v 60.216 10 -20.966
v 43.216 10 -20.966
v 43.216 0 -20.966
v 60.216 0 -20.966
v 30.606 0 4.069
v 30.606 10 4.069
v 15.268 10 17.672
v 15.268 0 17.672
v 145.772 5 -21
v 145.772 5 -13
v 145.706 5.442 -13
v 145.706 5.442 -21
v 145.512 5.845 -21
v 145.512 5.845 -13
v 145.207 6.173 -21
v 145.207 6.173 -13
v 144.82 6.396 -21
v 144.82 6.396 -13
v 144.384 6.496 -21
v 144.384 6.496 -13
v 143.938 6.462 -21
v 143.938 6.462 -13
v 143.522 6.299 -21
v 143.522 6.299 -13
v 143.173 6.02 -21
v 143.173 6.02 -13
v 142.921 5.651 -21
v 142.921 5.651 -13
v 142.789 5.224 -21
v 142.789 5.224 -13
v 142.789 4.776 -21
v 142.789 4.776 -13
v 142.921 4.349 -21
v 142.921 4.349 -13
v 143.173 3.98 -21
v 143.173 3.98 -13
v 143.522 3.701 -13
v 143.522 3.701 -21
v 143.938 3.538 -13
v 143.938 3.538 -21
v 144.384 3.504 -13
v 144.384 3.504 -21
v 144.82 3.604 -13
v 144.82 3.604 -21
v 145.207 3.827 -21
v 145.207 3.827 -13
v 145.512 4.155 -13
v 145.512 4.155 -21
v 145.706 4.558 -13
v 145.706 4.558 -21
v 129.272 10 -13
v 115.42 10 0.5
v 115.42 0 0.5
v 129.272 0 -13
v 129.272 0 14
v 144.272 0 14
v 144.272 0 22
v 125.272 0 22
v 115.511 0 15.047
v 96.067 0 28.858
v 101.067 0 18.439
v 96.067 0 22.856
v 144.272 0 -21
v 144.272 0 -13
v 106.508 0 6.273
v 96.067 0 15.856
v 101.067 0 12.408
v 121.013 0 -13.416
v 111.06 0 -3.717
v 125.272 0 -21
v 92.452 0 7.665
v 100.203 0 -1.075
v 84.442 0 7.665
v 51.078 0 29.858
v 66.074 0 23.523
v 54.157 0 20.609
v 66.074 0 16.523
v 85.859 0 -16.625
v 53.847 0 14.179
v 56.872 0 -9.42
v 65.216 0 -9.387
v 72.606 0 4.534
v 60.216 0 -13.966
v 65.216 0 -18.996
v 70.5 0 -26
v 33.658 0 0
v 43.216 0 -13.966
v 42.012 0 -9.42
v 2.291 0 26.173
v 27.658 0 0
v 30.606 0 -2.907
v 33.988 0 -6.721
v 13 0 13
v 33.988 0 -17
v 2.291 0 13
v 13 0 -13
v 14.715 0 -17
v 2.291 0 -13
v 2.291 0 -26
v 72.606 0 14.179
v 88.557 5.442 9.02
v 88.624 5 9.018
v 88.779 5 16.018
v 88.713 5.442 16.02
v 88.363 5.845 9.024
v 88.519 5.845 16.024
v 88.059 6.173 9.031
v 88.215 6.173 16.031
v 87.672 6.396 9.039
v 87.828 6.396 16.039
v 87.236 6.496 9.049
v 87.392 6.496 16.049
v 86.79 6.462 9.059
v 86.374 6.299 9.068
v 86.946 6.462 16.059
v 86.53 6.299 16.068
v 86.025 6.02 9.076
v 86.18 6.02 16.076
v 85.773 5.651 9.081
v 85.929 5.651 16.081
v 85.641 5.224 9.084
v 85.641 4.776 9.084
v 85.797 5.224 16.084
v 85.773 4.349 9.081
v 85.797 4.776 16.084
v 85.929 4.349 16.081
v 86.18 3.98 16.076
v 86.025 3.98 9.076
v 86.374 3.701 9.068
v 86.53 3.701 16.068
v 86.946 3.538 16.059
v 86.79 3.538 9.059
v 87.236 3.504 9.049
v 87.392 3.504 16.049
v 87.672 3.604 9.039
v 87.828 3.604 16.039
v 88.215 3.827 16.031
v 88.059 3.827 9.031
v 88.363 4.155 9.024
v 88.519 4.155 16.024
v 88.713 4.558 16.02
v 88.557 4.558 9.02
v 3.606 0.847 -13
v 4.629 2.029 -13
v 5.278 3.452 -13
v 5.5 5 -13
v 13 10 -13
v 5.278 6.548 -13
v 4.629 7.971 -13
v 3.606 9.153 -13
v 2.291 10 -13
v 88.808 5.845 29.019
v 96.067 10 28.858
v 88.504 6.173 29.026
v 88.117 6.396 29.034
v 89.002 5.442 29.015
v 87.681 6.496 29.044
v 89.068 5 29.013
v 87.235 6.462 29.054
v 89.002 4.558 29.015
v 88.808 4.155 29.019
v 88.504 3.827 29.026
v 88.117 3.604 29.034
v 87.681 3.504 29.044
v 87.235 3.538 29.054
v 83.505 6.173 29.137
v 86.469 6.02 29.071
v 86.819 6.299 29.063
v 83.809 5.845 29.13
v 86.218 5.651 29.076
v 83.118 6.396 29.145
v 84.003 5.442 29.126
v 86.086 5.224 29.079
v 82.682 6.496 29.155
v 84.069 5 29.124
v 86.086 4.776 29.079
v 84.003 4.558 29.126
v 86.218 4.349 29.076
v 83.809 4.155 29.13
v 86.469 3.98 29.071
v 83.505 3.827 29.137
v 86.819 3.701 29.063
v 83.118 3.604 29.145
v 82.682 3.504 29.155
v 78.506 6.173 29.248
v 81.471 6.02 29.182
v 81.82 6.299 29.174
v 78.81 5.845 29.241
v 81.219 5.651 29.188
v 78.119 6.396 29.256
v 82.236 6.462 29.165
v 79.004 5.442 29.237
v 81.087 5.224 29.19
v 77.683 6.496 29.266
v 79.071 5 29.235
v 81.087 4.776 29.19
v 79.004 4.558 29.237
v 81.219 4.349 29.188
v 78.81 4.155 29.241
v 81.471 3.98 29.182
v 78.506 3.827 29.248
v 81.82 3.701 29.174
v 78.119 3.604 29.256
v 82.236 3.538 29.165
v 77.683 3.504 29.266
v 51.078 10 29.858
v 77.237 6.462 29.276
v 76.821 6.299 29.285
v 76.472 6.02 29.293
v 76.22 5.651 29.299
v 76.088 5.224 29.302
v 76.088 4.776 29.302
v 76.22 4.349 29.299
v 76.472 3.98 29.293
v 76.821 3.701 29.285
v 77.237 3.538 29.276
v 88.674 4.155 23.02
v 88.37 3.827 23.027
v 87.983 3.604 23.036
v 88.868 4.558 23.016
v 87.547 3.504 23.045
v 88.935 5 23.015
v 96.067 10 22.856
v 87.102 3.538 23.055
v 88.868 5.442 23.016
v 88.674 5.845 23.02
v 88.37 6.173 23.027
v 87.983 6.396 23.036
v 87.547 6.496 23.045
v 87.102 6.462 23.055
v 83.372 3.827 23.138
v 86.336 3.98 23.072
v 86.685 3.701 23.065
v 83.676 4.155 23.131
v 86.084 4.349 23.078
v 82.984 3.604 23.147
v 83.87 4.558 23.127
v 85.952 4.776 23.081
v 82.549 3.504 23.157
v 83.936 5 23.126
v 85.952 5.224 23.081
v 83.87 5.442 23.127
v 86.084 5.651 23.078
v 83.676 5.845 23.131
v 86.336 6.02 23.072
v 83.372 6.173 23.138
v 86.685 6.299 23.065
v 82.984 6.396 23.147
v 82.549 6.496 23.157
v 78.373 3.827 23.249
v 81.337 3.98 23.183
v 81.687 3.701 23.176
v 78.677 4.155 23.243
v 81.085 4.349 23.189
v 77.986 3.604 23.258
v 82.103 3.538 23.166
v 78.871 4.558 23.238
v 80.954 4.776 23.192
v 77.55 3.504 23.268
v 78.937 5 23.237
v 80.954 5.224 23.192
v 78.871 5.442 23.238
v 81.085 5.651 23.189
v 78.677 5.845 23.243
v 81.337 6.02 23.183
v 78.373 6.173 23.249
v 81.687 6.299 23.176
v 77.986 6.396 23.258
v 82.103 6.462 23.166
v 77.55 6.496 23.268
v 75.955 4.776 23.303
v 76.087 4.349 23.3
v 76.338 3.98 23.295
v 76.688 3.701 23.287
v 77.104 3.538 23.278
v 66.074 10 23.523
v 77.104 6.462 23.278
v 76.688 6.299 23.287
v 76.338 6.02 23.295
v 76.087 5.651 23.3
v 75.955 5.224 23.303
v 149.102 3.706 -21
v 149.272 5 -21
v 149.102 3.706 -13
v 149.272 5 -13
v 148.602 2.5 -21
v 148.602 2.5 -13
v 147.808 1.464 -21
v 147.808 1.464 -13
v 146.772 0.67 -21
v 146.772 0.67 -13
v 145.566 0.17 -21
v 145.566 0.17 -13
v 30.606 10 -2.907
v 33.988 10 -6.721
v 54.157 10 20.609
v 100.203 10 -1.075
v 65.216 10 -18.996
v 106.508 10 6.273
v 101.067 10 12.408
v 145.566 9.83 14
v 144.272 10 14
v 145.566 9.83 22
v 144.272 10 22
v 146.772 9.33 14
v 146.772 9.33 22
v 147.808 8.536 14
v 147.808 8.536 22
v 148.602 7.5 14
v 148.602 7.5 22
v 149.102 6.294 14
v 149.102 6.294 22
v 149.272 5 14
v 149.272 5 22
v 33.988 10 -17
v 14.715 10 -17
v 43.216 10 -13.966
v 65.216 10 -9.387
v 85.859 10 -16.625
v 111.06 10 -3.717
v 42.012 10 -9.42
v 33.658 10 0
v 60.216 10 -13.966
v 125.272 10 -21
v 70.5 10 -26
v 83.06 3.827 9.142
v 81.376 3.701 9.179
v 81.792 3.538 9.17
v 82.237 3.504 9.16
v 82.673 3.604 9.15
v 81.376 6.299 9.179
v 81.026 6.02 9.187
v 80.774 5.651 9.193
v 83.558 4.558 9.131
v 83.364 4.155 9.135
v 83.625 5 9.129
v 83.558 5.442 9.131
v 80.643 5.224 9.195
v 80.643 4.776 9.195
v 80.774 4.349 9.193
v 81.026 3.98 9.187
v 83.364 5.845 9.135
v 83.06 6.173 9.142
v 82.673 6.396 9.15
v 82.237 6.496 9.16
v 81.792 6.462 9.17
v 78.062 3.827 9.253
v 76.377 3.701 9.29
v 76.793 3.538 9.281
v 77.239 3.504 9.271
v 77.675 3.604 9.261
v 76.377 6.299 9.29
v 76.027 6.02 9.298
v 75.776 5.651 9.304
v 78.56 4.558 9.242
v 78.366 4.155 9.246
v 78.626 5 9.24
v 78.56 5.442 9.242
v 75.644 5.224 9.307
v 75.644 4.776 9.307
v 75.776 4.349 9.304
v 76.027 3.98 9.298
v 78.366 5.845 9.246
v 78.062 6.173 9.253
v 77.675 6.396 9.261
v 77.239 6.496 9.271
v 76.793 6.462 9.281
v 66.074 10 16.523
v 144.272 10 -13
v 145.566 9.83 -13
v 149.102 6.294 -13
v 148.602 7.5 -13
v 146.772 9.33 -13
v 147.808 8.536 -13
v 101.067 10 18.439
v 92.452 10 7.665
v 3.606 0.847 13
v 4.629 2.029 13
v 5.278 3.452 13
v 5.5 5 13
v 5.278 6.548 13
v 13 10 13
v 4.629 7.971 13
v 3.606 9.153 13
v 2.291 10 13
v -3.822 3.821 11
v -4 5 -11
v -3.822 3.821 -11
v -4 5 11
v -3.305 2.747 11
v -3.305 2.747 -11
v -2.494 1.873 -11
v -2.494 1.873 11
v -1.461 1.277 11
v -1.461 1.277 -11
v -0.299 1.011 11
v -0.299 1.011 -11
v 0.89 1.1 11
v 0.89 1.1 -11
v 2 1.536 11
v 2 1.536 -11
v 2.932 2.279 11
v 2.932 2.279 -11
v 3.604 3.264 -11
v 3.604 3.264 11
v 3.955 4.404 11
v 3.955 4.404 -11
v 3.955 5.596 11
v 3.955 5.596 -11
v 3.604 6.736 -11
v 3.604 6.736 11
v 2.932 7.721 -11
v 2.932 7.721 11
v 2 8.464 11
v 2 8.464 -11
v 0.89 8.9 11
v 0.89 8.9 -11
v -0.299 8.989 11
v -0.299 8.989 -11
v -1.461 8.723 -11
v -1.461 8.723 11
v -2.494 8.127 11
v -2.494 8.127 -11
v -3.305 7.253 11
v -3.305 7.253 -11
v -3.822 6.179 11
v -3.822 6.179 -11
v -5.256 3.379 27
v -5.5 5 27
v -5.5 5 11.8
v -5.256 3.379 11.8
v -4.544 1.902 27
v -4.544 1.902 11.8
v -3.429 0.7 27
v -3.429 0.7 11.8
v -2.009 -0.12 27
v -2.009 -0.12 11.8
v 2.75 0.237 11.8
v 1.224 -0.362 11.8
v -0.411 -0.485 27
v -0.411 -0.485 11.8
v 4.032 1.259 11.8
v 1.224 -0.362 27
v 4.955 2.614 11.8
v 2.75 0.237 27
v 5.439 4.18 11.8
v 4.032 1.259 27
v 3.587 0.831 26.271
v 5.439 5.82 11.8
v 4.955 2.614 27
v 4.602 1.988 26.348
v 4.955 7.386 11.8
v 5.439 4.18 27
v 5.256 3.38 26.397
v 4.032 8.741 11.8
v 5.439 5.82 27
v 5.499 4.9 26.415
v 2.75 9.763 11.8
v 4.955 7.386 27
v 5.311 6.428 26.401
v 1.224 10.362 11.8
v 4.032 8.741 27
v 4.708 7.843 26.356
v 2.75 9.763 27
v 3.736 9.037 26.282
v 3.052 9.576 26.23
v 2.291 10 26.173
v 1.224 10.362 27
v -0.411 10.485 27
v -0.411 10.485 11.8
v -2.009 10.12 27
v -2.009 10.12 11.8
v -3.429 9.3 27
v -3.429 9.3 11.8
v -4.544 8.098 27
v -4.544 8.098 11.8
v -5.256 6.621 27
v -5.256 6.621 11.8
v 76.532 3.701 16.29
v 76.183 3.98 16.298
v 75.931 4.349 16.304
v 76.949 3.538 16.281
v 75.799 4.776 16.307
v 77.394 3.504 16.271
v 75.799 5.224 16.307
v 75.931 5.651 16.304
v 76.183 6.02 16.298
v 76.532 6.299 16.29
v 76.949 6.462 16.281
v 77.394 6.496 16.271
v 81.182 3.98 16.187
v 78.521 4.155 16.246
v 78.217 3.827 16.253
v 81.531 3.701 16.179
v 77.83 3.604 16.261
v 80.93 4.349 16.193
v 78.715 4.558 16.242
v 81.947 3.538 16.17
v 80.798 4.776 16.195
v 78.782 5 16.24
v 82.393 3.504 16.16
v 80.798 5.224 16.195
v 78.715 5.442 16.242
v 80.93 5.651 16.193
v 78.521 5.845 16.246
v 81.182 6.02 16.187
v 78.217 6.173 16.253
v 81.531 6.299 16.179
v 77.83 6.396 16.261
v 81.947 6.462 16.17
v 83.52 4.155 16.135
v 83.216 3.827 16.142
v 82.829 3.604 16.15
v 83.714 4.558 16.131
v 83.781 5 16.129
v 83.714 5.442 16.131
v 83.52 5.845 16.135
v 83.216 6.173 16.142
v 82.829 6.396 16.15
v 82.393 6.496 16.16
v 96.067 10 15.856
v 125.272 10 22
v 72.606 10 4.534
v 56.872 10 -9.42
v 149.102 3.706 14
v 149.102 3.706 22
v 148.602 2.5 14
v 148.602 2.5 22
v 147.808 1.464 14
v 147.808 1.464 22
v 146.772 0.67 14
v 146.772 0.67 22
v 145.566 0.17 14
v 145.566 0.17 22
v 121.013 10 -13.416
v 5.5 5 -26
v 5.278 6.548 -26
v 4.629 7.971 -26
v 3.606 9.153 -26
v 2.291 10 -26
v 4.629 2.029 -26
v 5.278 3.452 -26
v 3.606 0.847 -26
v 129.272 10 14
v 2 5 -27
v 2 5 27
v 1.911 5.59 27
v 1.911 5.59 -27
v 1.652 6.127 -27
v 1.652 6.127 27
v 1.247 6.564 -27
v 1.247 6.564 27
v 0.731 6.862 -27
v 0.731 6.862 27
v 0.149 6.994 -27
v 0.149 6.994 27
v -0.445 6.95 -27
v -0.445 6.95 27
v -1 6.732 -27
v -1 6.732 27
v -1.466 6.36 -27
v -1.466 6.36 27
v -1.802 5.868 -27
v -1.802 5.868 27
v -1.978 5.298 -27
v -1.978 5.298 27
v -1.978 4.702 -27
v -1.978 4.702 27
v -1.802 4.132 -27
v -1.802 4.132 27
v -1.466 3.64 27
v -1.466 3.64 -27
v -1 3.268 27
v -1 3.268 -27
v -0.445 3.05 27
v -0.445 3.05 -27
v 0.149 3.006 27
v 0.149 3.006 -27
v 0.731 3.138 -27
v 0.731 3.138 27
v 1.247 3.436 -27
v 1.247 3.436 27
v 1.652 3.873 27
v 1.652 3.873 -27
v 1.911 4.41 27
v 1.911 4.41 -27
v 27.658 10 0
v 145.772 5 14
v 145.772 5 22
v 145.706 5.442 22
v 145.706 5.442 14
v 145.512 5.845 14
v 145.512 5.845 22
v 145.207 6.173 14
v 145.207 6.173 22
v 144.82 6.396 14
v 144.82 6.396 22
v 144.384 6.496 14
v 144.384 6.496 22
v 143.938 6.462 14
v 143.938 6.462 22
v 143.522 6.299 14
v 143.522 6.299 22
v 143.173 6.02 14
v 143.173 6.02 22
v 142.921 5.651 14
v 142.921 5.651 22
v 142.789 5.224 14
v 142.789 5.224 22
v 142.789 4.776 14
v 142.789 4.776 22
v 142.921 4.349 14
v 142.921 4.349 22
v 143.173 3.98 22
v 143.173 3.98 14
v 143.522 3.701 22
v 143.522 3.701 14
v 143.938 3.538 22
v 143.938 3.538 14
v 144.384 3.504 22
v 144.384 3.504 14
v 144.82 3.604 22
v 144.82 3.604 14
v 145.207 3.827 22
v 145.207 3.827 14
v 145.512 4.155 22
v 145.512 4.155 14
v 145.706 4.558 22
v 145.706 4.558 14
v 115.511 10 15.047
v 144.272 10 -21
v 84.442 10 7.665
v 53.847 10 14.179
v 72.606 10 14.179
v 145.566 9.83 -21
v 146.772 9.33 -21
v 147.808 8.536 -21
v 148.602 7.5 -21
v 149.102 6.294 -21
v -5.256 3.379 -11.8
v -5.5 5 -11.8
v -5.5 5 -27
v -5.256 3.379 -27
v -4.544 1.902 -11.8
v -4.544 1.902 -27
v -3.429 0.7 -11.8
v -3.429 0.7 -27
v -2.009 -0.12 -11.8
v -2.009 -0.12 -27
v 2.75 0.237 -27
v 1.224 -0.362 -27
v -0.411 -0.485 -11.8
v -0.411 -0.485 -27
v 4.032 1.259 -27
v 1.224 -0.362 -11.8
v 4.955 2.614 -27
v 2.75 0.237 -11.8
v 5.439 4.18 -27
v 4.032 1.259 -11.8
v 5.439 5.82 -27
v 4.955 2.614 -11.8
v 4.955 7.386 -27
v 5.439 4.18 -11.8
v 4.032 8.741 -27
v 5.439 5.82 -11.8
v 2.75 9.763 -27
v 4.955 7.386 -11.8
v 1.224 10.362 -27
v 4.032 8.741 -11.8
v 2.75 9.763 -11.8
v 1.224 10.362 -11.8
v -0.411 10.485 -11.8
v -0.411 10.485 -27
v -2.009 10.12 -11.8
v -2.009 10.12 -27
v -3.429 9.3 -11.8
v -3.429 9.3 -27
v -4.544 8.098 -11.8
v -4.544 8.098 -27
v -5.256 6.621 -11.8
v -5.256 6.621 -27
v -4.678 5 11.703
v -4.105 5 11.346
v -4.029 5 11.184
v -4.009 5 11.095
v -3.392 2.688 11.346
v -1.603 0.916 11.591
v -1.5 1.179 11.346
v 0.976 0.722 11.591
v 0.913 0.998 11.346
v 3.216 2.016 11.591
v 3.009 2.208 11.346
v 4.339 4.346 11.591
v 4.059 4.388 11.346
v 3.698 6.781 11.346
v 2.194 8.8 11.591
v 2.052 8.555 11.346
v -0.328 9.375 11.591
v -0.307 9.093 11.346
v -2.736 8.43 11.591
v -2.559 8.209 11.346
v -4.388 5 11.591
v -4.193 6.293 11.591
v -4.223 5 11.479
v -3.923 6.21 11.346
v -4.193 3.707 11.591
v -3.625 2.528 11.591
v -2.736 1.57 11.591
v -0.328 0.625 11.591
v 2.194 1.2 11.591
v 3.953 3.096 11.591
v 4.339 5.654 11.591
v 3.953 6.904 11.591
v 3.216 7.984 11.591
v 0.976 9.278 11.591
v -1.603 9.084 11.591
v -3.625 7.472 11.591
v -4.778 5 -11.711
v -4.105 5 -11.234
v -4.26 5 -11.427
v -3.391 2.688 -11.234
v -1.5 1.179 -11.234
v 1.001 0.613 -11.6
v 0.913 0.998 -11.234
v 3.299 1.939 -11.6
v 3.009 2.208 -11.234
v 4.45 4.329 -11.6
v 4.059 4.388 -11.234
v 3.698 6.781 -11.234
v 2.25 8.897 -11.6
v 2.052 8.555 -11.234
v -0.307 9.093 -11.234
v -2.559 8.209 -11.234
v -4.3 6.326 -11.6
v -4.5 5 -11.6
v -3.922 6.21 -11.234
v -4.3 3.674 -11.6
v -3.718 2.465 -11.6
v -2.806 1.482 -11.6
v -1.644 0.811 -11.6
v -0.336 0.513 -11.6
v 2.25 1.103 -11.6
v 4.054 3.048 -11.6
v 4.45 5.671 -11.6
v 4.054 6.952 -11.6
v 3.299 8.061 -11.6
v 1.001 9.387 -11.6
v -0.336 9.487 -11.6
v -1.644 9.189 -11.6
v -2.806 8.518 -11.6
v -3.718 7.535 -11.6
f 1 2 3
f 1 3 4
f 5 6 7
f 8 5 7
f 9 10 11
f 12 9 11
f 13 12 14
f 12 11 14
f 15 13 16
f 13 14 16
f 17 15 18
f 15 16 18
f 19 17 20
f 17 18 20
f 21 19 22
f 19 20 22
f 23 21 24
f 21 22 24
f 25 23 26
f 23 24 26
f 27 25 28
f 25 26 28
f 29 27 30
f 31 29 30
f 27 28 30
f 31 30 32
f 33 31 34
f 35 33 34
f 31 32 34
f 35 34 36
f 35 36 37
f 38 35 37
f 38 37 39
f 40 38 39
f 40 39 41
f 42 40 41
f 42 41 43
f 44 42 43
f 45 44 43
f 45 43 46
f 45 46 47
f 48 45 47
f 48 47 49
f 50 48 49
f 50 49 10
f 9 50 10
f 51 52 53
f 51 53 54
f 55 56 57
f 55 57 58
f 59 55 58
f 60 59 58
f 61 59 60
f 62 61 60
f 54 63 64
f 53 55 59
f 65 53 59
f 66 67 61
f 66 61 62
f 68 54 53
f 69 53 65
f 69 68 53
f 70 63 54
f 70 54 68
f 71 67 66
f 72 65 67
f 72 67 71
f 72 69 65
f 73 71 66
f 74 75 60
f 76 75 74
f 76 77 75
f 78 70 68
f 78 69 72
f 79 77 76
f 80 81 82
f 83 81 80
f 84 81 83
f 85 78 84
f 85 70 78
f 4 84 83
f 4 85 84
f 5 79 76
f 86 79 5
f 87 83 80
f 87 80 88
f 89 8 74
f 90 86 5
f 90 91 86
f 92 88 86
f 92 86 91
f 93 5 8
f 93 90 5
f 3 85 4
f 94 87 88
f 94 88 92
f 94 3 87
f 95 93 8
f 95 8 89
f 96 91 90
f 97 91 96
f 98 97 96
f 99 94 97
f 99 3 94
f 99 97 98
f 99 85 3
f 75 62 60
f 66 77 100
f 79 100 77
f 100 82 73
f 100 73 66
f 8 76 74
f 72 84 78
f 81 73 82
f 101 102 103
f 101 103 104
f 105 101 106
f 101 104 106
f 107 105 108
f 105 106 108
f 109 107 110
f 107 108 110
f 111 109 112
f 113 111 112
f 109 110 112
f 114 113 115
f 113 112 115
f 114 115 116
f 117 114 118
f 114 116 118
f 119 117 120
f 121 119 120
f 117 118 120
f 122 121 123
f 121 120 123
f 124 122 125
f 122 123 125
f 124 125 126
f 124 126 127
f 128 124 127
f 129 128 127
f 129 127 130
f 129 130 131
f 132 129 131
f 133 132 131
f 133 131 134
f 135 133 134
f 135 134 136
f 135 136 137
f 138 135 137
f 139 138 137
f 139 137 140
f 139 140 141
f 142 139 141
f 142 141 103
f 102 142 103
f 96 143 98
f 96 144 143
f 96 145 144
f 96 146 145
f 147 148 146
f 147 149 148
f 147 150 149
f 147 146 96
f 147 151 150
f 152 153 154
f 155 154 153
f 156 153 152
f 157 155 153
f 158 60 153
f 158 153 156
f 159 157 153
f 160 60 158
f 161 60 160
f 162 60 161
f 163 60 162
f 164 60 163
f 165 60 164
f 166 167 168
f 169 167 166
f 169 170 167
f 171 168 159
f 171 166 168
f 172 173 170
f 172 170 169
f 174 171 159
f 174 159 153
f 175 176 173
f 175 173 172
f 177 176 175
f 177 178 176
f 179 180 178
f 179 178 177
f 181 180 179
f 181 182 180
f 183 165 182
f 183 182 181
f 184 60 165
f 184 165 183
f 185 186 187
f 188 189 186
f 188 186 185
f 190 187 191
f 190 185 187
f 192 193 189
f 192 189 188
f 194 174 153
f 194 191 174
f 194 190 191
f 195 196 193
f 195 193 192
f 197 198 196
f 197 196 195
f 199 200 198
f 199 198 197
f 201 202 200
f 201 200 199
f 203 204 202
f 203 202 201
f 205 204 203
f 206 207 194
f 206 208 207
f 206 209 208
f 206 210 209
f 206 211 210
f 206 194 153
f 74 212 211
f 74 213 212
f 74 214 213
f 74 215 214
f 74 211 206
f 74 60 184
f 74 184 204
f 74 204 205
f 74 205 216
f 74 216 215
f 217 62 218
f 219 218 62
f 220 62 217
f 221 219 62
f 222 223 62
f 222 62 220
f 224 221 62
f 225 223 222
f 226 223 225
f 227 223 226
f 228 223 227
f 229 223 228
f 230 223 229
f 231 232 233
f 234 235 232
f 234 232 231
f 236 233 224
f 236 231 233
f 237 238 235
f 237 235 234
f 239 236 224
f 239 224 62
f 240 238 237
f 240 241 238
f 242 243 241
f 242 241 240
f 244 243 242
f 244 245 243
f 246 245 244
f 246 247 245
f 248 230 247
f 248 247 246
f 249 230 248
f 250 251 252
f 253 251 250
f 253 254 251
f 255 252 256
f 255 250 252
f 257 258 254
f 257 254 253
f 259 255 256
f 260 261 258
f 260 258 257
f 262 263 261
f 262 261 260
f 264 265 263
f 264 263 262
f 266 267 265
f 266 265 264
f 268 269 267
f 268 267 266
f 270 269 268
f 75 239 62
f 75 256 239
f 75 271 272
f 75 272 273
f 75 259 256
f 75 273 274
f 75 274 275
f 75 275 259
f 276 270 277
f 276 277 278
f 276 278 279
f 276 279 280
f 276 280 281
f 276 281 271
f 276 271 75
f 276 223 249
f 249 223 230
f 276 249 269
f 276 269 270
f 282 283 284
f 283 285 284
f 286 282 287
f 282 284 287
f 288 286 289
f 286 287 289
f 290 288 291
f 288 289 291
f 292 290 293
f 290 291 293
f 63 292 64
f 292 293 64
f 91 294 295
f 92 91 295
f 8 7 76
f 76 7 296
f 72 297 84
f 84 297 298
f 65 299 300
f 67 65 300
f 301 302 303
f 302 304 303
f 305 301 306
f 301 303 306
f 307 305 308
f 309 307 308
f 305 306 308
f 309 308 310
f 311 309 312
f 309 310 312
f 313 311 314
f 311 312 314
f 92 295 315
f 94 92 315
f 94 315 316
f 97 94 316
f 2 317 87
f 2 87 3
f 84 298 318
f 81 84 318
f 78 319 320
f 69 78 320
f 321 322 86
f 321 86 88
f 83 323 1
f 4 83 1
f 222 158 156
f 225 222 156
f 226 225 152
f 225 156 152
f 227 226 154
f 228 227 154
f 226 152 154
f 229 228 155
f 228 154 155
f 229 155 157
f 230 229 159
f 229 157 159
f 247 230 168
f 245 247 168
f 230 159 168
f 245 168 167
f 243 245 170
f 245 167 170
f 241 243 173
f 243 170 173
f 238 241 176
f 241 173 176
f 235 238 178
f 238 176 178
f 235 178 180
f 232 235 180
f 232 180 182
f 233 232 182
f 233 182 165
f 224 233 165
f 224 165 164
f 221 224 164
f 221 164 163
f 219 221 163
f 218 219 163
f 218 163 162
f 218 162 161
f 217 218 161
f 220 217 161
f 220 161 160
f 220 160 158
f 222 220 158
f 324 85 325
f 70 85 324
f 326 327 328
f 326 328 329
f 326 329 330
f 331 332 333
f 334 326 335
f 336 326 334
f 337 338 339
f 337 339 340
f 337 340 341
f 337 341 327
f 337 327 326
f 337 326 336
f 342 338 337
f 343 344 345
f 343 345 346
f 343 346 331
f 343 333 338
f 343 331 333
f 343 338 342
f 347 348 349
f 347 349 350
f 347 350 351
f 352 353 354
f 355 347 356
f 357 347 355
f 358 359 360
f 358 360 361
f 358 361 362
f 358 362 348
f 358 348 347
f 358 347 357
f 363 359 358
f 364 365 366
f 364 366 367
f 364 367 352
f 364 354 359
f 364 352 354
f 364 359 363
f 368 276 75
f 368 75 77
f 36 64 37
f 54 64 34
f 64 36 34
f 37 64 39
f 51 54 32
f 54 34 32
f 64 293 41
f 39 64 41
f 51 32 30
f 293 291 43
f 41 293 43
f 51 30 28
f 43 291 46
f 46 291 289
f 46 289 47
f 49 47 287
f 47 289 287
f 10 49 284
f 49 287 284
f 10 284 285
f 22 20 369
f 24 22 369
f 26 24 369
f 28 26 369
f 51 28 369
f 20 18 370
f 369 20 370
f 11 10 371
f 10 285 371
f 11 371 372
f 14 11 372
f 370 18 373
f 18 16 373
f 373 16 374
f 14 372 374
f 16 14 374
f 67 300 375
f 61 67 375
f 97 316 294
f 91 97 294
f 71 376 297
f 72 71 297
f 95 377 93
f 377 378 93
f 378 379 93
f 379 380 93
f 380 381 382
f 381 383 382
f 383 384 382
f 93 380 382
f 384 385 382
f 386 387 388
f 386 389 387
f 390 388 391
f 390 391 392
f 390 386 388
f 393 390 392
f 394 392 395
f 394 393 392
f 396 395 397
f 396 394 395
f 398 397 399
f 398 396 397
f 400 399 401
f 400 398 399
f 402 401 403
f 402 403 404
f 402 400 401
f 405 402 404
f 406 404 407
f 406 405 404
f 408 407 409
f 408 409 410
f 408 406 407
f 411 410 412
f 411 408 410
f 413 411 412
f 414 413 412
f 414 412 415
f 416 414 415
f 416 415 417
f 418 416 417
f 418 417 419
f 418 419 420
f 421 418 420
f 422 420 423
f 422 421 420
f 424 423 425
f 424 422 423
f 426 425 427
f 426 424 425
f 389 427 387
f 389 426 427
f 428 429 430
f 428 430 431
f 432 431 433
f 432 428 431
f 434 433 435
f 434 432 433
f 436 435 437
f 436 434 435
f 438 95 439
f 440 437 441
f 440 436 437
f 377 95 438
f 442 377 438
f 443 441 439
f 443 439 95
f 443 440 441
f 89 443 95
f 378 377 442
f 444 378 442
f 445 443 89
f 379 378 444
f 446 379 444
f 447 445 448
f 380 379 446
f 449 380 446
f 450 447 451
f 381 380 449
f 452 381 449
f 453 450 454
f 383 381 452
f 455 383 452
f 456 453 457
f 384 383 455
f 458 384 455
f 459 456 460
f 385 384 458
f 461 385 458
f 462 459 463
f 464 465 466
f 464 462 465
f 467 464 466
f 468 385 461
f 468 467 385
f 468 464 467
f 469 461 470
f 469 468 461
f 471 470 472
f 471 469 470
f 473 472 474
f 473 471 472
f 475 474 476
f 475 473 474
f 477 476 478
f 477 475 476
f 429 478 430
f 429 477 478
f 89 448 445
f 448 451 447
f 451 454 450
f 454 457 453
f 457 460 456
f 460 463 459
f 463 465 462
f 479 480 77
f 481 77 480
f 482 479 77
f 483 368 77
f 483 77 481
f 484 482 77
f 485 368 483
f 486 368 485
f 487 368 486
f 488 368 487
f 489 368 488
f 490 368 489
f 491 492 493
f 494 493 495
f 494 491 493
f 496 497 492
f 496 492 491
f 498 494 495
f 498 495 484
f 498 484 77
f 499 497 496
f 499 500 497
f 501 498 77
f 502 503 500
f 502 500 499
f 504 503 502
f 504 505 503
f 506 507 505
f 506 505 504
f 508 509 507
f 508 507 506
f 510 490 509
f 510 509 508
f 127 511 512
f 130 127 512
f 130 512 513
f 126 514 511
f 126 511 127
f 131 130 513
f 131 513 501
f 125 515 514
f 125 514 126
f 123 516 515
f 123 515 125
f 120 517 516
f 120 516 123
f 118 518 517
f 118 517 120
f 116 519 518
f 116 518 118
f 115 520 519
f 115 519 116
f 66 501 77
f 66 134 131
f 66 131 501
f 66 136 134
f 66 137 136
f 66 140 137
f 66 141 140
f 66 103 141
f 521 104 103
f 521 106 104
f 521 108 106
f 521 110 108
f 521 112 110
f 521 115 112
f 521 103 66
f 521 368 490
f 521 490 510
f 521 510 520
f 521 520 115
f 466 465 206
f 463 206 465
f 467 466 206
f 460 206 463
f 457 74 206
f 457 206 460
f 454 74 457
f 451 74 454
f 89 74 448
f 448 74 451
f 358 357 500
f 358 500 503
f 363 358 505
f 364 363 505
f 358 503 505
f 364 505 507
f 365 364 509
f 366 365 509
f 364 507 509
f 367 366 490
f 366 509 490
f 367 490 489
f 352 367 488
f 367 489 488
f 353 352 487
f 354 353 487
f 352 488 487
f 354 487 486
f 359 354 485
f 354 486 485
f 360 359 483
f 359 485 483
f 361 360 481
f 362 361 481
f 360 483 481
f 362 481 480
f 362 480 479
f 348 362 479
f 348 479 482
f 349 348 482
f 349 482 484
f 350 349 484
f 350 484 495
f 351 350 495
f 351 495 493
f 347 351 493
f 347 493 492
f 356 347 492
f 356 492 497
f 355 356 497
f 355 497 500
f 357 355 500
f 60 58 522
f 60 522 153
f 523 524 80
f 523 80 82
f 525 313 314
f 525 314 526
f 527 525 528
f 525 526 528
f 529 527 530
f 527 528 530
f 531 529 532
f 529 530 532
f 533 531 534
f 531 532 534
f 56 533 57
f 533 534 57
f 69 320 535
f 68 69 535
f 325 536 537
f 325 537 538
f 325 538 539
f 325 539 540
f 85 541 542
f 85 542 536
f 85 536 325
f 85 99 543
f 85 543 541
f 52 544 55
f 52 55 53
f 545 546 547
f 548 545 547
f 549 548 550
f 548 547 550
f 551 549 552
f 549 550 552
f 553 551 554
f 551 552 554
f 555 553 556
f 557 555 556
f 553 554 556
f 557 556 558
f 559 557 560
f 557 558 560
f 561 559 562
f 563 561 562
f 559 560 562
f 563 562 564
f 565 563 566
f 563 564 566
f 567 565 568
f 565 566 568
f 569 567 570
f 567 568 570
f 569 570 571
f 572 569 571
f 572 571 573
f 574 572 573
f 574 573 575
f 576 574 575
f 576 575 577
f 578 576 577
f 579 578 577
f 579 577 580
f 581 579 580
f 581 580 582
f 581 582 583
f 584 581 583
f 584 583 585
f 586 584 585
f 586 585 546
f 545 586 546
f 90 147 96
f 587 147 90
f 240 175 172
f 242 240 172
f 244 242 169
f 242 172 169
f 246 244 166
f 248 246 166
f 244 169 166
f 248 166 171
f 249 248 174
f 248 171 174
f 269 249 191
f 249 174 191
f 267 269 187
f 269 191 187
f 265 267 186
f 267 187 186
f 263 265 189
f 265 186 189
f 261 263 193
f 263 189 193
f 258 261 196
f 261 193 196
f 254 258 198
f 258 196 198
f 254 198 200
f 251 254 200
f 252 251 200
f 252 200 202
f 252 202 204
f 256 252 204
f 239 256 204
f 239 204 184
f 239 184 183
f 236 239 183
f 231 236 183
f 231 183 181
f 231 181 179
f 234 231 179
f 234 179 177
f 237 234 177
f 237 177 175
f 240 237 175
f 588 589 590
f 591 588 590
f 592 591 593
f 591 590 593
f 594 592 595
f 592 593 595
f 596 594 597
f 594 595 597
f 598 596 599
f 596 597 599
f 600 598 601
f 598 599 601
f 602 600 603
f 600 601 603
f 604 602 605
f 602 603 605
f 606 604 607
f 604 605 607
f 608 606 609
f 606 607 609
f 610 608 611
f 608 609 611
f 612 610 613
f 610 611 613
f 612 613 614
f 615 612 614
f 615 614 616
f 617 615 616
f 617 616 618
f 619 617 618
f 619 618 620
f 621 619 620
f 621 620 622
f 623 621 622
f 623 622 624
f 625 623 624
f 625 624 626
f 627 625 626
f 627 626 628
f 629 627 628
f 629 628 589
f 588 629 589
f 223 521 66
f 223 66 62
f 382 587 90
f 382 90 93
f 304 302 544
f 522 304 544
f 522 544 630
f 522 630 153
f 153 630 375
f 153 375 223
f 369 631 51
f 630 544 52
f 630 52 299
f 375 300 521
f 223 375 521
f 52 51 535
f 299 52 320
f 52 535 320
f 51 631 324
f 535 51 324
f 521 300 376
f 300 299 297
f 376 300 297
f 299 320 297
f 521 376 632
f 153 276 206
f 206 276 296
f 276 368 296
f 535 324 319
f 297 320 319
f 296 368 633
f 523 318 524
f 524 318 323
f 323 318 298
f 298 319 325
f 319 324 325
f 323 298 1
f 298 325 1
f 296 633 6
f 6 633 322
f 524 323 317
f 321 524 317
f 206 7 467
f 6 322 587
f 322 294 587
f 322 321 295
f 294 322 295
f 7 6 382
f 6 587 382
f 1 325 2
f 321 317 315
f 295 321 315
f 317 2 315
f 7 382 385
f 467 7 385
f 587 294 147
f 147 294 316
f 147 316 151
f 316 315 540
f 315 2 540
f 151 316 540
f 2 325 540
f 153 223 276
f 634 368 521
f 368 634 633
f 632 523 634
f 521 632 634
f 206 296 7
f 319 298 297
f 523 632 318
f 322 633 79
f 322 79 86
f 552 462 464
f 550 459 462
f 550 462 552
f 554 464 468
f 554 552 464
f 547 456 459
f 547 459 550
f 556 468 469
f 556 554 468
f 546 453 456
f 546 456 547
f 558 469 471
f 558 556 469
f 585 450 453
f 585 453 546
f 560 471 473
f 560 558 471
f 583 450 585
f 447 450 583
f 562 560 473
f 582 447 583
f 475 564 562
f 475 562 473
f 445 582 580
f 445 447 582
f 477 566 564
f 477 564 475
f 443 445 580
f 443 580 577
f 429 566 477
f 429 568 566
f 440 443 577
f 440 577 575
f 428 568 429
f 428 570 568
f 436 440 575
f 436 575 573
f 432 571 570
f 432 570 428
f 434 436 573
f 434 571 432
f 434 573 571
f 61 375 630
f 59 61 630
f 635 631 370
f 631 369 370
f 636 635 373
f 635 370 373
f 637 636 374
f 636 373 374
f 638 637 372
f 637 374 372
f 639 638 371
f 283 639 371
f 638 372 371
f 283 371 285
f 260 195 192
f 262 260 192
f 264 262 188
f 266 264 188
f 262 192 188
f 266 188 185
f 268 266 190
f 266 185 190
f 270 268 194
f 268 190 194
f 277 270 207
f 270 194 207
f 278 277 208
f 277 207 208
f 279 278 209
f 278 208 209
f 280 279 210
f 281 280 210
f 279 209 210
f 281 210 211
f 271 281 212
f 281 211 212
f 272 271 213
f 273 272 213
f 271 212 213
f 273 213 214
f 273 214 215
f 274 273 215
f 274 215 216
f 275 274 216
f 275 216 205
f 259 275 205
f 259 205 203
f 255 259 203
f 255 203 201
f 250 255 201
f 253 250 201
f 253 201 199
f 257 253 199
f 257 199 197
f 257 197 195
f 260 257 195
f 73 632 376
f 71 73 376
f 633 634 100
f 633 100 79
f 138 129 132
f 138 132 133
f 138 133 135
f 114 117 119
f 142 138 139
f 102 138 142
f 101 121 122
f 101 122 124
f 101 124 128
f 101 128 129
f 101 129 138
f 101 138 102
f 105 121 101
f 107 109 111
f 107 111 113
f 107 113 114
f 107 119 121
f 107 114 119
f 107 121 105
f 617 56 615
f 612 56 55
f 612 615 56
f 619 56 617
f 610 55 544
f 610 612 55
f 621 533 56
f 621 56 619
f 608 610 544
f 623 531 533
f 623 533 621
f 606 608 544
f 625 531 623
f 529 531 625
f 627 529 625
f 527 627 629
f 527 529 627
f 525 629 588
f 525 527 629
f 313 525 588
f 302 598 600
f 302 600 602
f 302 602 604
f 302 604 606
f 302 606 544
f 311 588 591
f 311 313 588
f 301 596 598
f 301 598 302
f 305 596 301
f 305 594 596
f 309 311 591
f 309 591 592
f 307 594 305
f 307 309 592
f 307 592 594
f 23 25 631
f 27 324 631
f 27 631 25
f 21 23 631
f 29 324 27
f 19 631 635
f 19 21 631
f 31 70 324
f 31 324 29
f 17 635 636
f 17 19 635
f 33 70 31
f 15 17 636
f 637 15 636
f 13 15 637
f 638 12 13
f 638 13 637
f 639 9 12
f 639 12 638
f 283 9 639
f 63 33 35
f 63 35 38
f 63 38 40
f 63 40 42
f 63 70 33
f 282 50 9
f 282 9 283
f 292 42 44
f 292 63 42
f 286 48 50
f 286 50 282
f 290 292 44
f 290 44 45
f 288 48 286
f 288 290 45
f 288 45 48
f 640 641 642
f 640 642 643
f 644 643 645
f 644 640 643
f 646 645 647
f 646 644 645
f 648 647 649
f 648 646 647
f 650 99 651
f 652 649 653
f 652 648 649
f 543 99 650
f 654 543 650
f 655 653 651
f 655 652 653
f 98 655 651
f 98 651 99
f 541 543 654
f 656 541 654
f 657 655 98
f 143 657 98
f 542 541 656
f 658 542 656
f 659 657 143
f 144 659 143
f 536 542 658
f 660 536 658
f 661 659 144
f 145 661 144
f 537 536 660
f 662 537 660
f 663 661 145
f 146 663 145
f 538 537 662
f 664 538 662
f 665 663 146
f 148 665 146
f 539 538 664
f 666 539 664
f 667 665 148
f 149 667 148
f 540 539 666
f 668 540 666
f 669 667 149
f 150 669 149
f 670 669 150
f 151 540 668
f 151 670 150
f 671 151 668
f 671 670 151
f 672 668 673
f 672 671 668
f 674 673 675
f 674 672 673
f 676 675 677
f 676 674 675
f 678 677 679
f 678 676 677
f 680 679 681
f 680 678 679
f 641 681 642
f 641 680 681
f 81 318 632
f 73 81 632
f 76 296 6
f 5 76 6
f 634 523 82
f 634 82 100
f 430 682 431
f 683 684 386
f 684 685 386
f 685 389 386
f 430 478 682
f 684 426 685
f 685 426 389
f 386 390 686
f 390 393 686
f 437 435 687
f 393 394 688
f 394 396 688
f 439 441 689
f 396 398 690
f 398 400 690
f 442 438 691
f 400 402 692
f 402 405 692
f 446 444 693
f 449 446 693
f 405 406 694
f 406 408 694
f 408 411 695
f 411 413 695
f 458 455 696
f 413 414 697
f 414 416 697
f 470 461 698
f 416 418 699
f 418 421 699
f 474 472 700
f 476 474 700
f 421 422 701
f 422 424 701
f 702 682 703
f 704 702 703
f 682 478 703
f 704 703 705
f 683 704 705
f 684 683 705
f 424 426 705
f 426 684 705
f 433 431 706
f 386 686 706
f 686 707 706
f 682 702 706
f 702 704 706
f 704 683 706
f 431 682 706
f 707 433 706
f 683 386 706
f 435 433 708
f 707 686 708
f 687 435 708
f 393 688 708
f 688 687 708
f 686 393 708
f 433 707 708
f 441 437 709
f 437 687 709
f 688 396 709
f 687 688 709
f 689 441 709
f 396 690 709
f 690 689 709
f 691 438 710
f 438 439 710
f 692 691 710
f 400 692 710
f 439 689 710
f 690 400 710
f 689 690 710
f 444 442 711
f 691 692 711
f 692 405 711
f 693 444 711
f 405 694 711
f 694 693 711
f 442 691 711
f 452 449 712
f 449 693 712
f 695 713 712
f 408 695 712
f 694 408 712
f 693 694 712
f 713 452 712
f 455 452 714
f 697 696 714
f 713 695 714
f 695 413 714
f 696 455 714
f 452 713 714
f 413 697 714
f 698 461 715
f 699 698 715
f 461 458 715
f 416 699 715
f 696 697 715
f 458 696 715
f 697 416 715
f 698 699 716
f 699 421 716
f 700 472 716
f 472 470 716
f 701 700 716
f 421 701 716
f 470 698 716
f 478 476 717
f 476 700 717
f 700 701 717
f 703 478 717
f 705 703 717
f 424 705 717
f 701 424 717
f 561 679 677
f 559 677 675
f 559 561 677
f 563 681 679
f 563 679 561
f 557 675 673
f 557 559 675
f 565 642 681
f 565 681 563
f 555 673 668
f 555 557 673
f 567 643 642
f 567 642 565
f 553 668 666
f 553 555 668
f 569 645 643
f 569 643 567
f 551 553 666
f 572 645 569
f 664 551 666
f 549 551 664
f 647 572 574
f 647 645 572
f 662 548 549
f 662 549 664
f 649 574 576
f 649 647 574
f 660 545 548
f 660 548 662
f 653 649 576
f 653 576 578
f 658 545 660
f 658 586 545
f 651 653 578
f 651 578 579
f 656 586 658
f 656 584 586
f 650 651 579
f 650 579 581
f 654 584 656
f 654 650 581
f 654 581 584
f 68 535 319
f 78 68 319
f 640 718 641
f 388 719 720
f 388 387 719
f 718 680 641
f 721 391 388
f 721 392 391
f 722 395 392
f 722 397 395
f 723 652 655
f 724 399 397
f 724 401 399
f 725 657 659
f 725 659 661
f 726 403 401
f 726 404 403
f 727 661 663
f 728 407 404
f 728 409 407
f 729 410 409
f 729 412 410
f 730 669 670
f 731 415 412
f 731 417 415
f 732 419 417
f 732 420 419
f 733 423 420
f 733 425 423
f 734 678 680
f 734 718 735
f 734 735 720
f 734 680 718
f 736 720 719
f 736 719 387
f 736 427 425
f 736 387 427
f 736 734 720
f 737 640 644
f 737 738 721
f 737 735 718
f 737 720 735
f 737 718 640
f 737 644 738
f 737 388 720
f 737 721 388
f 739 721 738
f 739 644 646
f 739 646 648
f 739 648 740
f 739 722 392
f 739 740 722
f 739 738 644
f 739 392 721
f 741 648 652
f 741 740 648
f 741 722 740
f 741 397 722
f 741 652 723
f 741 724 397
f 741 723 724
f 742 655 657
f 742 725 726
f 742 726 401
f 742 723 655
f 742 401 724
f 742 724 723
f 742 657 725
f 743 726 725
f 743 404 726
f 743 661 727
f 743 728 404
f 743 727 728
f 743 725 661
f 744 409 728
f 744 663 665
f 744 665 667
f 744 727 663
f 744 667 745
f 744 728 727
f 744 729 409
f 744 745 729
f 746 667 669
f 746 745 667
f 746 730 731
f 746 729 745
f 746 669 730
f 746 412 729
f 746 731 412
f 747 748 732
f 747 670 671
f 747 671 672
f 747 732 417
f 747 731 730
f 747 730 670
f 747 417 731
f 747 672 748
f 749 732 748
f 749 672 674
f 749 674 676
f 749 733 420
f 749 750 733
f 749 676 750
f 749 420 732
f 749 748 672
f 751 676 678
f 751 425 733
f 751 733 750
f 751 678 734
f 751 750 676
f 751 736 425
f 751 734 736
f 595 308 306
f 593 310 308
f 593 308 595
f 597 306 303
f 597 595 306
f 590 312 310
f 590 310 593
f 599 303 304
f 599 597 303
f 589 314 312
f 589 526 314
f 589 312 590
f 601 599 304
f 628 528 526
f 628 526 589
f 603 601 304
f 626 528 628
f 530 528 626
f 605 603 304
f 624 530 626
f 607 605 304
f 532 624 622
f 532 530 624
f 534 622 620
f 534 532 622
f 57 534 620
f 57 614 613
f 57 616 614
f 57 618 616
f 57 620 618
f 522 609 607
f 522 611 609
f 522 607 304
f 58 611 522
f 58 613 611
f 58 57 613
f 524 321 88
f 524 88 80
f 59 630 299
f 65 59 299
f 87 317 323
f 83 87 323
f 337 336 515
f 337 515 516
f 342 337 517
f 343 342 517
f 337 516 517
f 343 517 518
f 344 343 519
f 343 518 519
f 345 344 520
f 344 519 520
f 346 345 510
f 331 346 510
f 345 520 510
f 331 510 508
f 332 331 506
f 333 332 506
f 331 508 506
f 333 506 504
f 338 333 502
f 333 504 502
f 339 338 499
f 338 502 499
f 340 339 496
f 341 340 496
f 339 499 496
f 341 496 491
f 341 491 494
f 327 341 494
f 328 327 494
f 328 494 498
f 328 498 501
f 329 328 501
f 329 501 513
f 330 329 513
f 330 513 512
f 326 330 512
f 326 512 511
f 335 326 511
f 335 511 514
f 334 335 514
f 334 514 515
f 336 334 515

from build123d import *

# Parameters (mm, degrees)
RESSALTO_EXTRUS_O1_DEPTH = 10
ESBO_O4_W                = 13
ESBO_O4_H                = 26
CORTE_EXTRUS_O1_DEPTH    = 153.557132499
ESBO_O5_R                = 2
CORTE_EXTRUS_O2_DEPTH    = 160.086317259
ESBO_O6_W                = 27
ESBO_O6_H                = 10
CORTE_EXTRUS_O3_DEPTH    = 20
FILETE1_R                = 5
FILETE2_R                = 5
ESBO_O7_R                = 1.5
CORTE_EXTRUS_O4_DEPTH    = 158.459379965
ESBO_O8_R                = 1.5
CORTE_EXTRUS_O5_DEPTH    = 20
ESBO_O10_W               = 17
ESBO_O10_H               = 7
CORTE_EXTRUS_O8_DEPTH    = 10


with BuildPart() as part:
    # Esboço1 → Ressalto-extrusão1 (new body)
    with BuildSketch(Plane(origin=(0, 0, 0), x_dir=(1, 0, 0), z_dir=(0, 1, 0))):
        Polygon((0, -26), (0, 26), (70.5, 26), (125.272255751, 21), (149.272255751, 21), (149.272255751, -22), (125.272255751, -22), (96.066533251, -28.85753405), (51.077645734, -29.85753405), align=None)
    extrude(amount=RESSALTO_EXTRUS_O1_DEPTH)

    # Esboço4 → Corte-extrusão1 (cut, through all)
    with BuildSketch(Plane(origin=(0, 10, 0), x_dir=(1, 0, 0), z_dir=(0, 1, 0))):
        with Locations((6.5, 0)):
            Rectangle(ESBO_O4_W, ESBO_O4_H)
    extrude(amount=-CORTE_EXTRUS_O1_DEPTH, mode=Mode.SUBTRACT)

    # Esboço2 → Revolução1 (revolve)
    with BuildSketch(Plane.ZY, mode=Mode.PRIVATE) as revolu_o1_sk:
        with BuildLine():
            Line((-27, 5), (-27, 10.5))
            Line((-27, 10.5), (-11.8, 10.5))
            add(Edge.make_bspline(
                [(-11.8, 10.5), (-11.799257972, 9.25000022), (-11, 9)],
                knots=[0, 0, 0, 1, 1, 1], degree=2))
            Line((-11, 9), (11, 9))
            add(Edge.make_bspline(
                [(11.8, 10.5), (11.782356414, 9.025535941), (11, 9)],
                knots=[0, 0, 0, 1, 1, 1], degree=2))
            Line((11.8, 10.5), (27, 10.5))
            Line((27, 10.5), (27, 5))
            Line((27, 5), (-27, 5))
        make_face()
    revolve(revolu_o1_sk.sketch.rotate(Axis((0, 5, -27), (0, 0, 1)), 90), axis=Axis((0, 5, -27), (0, 0, 1)))

    # Esboço5 → Corte-extrusão2 (cut, through all)
    with BuildSketch(Plane.XY.offset(27)):
        with Locations((0, 5)):
            Circle(ESBO_O5_R)
    extrude(amount=-CORTE_EXTRUS_O2_DEPTH, mode=Mode.SUBTRACT)

    # Esboço6 → Corte-extrusão3 (cut)
    with BuildSketch(Plane(origin=(149.272255751, 0, 0), x_dir=(0, 0, -1), z_dir=(1, 0, 0))):
        with Locations((-0.5, 5)):
            Rectangle(ESBO_O6_W, ESBO_O6_H)
    extrude(amount=-CORTE_EXTRUS_O3_DEPTH, mode=Mode.SUBTRACT)

    # Filete1
    filete1_edges = [part.edges().sort_by_distance(p)[0] for p in [
        (149.272255751, 10, 18),
    ]]
    fillet(filete1_edges, radius=FILETE1_R)

    # Filete2
    filete2_edges = [part.edges().sort_by_distance(p)[0] for p in [
        (149.272255751, 0, -17),
        (149.272255751, 10, -17),
        (149.272255751, 0, 18),
    ]]
    fillet(filete2_edges, radius=FILETE2_R - 0.0001)  # a hair under: the kernel refuses the full size

    # Esboço7 → Corte-extrusão4 (cut, through all)
    with BuildSketch(Plane.XY.offset(22)):
        with Locations((144.272255751, 5)):
            Circle(ESBO_O7_R)
    extrude(amount=-CORTE_EXTRUS_O4_DEPTH, mode=Mode.SUBTRACT)

    # Esboço8 → Corte-extrusão5 (cut)
    with BuildSketch(Plane(origin=(0.688560438, 0, 30.977568087), x_dir=(0.9997530559290662, 0, -0.02222222222222223), z_dir=(0.02222222222222223, 0, 0.9997530559290662))):
        with Locations((86.901531655, 5)):
            Circle(ESBO_O8_R)
        with Locations((81.901531655, 5)):
            Circle(ESBO_O8_R)
        with Locations((76.901531655, 5)):
            Circle(ESBO_O8_R)
    extrude(amount=-CORTE_EXTRUS_O5_DEPTH, mode=Mode.SUBTRACT)

    # Esboço10 → Corte-extrusão8 (cut)
    with BuildSketch(Plane(origin=(0, 10, 0), x_dir=(1, 0, 0), z_dir=(0, 1, 0))):
        Polygon((96.066533251, -22.85605202), (66.073941573, -23.522718687), (66.073941573, -16.522718687), (96.066533251, -15.85605202), align=None)
        Polygon((13, 13), (27.658080306, 0), (13, -13), align=None)
        Polygon((14.715215875, 17), (30.605506577, 2.907173735), (33.988145027, 6.721249585), (33.988145027, 17), align=None)
        Polygon((30.605506577, -4.06909346), (15.267814751, -17.67182926), (54.15706585, -20.608859895), align=None)
        Polygon((33.658080306, 0), (42.012333551, 9.419793458), (56.871686456, 9.419793458), (72.605550348, -4.534300553), (72.605550348, -14.178506447), (53.847357844, -14.178506447), align=None)
        with Locations((51.715539775, 17.466082457)):
            Rectangle(ESBO_O10_W, ESBO_O10_H)
        Polygon((85.85936677, 16.625472682), (111.060316292, 3.717254981), (121.012658968, 13.416430831), align=None)
        Polygon((129.272255751, -14), (115.419880228, -0.5), (129.272255751, 13), align=None)
        Polygon((65.215539775, 18.996331638), (65.215539775, 9.387469518), (84.442487674, -7.664580783), (92.451959357, -7.664580783), (100.203174703, 1.075260526), align=None)
        Polygon((115.511410207, -15.047093106), (106.507920849, -6.272633726), (101.066533251, -12.408041141), (101.066533251, -18.438765254), align=None)
    extrude(amount=-CORTE_EXTRUS_O8_DEPTH, mode=Mode.SUBTRACT)


solid = part.part
